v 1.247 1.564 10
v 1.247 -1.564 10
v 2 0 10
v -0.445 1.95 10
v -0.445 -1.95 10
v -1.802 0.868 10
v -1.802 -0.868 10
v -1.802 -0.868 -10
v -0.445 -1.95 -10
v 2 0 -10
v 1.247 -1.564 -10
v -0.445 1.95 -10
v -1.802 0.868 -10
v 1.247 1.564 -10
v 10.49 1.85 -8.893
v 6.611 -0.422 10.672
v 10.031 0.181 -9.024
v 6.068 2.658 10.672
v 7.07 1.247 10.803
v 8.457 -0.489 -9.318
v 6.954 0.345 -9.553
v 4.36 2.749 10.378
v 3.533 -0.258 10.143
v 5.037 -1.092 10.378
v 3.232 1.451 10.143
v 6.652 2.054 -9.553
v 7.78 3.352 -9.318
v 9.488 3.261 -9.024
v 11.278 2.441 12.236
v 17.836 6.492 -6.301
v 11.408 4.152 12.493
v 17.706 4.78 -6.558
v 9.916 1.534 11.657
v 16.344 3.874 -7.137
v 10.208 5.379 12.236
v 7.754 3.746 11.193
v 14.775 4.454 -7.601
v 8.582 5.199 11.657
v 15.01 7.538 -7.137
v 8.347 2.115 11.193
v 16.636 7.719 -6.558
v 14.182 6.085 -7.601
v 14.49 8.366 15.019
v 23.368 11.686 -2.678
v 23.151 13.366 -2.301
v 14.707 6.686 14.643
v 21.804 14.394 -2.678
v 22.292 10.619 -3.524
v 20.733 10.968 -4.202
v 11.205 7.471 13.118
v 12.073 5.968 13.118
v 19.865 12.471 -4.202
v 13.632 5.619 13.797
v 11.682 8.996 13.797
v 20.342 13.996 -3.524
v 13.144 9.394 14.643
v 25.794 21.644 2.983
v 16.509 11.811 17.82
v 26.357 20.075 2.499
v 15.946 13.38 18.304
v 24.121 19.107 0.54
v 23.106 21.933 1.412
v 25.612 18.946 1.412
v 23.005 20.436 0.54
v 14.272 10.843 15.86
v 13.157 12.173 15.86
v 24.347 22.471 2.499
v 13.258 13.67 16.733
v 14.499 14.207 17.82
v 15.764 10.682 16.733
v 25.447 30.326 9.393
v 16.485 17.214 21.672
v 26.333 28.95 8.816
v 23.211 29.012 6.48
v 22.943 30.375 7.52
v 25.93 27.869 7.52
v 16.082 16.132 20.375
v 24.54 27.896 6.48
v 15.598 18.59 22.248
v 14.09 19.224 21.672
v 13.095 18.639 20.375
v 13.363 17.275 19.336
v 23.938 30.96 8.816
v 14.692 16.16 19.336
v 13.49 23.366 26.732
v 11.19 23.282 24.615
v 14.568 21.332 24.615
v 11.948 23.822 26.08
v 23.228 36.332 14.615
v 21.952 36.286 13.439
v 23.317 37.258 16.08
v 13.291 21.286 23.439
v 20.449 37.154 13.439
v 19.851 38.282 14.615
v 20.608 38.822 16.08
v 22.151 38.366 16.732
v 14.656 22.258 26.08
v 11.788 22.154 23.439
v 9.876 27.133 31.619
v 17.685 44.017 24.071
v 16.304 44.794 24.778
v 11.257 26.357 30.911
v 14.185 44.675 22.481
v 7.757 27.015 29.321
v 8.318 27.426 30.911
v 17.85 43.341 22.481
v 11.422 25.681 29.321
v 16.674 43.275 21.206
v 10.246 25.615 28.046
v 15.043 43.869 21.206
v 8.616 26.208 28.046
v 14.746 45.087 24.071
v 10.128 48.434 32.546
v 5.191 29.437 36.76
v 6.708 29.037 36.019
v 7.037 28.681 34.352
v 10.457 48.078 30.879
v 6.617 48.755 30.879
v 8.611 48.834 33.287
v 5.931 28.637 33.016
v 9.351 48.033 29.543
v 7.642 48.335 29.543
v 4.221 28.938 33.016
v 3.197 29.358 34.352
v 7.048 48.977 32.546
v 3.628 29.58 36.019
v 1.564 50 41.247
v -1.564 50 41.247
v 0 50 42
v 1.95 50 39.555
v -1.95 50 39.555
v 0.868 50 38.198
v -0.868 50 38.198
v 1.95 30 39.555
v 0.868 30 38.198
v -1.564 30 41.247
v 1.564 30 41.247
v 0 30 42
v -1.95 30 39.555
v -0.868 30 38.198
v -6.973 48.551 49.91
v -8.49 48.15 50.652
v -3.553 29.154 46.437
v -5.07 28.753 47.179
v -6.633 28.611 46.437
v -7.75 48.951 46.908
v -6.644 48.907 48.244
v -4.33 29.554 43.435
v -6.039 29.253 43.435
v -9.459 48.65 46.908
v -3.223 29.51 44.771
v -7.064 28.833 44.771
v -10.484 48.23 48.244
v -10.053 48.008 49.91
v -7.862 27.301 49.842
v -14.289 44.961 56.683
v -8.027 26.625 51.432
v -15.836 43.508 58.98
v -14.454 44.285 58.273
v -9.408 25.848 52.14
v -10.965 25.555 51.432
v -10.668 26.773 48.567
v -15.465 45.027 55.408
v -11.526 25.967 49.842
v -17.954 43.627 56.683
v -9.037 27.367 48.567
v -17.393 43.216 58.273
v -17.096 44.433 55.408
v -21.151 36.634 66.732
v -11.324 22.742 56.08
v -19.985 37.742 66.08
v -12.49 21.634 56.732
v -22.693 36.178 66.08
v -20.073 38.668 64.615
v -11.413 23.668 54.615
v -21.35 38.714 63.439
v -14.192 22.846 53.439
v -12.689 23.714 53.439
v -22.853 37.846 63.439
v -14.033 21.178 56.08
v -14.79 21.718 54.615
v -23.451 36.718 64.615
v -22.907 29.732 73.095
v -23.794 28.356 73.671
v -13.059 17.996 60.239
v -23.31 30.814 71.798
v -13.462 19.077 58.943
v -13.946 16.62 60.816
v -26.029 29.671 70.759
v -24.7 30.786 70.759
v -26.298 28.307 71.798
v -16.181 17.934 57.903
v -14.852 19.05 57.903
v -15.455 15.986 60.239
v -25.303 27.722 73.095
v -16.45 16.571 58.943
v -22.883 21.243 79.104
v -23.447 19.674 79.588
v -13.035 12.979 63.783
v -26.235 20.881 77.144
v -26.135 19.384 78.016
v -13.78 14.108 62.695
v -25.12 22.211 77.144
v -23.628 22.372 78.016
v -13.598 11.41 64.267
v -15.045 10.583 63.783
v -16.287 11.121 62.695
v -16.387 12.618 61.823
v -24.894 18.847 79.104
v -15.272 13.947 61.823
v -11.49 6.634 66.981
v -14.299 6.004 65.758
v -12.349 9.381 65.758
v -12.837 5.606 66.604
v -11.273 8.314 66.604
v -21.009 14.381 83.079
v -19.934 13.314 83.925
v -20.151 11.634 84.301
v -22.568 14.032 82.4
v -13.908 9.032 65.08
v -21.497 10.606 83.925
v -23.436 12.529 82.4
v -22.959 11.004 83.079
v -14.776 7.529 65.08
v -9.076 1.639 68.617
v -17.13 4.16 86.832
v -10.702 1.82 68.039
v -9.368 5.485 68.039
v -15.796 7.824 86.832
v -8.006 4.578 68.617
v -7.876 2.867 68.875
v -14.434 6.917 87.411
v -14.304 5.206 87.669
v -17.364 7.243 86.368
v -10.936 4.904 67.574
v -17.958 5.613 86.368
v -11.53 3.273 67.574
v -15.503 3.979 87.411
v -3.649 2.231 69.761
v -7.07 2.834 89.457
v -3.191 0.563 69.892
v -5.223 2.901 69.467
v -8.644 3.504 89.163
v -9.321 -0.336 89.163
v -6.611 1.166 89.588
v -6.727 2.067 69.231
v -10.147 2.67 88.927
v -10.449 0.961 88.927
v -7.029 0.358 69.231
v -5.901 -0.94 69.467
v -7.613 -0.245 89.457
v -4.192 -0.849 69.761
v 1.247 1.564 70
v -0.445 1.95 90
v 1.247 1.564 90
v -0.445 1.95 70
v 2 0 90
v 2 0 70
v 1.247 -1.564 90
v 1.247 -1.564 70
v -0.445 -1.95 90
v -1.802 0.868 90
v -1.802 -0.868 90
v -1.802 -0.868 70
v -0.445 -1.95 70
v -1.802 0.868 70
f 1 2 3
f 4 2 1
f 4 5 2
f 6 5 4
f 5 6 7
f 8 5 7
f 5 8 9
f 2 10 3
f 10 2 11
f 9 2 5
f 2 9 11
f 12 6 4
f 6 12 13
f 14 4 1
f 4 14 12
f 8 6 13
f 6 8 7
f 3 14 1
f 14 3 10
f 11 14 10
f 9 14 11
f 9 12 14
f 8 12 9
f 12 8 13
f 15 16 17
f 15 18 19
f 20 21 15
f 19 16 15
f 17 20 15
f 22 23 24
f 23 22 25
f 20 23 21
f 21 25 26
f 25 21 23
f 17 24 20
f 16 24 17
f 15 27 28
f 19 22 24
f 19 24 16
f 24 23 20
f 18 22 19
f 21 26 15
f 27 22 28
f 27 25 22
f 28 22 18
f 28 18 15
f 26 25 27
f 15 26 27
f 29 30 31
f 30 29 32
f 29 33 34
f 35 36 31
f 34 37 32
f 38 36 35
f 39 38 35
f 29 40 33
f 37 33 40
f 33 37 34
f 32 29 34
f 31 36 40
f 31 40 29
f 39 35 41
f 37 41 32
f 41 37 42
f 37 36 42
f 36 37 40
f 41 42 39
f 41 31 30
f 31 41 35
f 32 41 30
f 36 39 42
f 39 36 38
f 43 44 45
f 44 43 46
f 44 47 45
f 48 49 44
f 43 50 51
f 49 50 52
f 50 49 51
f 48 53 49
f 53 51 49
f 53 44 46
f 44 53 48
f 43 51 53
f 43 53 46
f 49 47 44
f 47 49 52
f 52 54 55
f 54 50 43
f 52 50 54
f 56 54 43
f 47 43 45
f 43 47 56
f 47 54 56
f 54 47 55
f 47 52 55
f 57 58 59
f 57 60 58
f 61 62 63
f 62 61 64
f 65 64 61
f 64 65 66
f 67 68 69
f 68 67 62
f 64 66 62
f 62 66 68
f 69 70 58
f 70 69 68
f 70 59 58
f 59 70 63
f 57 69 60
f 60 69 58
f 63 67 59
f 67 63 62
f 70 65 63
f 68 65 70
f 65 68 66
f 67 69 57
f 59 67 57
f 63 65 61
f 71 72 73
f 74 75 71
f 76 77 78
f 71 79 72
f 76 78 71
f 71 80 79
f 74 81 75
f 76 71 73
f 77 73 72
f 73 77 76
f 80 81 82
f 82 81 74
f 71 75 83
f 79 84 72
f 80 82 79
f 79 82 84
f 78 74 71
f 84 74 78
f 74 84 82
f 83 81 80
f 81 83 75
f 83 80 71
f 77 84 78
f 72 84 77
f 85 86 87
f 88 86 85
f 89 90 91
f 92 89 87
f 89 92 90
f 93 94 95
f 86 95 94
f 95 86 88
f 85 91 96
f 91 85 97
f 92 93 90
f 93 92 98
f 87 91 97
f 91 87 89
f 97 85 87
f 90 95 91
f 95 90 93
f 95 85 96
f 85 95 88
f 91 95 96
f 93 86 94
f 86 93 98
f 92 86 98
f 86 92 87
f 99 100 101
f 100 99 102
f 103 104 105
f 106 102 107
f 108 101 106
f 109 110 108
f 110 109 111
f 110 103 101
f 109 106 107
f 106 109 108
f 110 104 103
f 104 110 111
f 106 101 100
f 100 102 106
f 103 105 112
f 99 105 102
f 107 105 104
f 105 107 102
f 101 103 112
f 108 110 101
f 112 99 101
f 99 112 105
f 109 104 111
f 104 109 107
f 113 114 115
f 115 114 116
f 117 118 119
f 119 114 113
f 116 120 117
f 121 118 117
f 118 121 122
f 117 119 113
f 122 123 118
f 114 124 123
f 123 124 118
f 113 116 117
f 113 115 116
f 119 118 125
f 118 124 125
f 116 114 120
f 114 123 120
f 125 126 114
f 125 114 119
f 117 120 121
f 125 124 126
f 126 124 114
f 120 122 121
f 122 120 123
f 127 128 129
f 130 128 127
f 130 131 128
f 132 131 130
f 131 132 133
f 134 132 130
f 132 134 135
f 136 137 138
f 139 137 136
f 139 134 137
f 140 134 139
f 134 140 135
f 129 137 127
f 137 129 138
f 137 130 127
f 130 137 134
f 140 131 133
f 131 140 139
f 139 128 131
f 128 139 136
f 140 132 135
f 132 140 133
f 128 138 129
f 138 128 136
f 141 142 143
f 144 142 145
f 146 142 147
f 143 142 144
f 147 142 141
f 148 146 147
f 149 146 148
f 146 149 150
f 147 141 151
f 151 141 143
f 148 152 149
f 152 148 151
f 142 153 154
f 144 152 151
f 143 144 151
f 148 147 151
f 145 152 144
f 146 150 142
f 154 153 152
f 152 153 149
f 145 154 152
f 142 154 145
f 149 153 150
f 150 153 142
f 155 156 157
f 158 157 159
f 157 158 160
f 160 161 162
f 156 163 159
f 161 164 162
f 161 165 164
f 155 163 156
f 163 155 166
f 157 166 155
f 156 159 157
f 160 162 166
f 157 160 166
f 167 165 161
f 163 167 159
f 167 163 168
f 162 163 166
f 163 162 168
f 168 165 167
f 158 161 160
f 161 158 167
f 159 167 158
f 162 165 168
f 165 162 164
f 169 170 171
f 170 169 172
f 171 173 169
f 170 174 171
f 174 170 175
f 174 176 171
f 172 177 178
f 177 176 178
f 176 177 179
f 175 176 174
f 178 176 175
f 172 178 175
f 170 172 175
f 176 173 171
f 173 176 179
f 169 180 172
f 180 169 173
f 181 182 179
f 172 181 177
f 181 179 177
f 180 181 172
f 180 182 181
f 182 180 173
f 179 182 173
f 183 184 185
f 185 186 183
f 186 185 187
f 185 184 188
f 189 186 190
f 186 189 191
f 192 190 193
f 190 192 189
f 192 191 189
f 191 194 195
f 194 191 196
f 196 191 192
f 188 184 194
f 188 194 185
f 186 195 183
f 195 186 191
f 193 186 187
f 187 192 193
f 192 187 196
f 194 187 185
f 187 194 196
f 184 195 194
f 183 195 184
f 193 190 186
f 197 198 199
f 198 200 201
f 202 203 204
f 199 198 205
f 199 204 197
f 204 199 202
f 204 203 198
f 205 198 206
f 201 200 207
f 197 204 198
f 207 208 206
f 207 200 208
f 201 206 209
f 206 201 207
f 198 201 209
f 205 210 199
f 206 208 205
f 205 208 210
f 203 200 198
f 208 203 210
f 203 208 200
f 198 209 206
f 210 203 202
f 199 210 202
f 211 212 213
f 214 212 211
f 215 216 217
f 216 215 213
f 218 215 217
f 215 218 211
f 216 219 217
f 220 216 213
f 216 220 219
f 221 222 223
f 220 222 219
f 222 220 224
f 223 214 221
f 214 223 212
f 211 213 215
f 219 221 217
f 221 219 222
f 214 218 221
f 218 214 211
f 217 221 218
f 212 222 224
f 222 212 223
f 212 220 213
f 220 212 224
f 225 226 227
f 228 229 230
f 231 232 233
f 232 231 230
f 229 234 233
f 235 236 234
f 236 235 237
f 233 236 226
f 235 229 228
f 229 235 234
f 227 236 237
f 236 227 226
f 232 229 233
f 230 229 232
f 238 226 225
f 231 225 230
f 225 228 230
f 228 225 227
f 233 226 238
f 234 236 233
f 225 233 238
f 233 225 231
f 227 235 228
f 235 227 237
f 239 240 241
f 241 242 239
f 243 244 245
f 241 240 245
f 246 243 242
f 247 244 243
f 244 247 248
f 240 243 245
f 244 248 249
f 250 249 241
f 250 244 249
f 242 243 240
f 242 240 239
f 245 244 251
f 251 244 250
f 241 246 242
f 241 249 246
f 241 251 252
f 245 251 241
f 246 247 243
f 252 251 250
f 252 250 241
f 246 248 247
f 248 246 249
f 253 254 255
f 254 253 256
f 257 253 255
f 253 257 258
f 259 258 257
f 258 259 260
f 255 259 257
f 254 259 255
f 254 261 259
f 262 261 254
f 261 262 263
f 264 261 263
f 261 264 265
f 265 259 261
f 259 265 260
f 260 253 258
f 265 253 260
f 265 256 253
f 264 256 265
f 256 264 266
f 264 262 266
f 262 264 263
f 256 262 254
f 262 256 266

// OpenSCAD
module q(){
  cube([10,1,1],center=true);
  }
  
module c(){
    cube([1,1,1],center=true);
  }
  module o(){
    cylinder(1,2,2);
    }
  module cycle_rotate(i){
    for(i=[0:360/i:360])
  rotate([0,0,i])children();
    
  }
  module layer(l,h,angle=0){
    for(i=[0:h/l:h]){
      translate([0,i*angle,i])children();
      }
    }
    module sin_cycle(l,h,angle=0){
       for(i=[0:h/l:h]){
      translate([0,sin(i/3.14),i])children();
      }
      }

    //cycle_rotate(10)sin_cycle(10,10,-2)q();
module main0(){
for(b=[0:1:2]){
  for(a=[0:5:360]){
rotate([0,0,b*90])translate([0,sin(10*$t*360),a/10])rotate([0,0,a+$t*360])scale([1+sin(10*$t*360)*sin(a)+1,1,1+1])q();
  }
}

};

module main1(l){
  
  for(i=[0:360/l:90]){
  translate([0,i/10,0])rotate([0,i+0.2*i*$t*360,0])scale([1,1,3+10*i/90])c();
  }
  
  }
module main2(){
  for(i=[0:10:360]){

translate([0,0,4*i/360*(2+sin($t*360*30))])
rotate([0,0,i*2])
    translate([0,3,0])
c();
  }
}
module main3(){
  rotate([0,0,$t*360*30])
  for(i=[0:5:360]){
rotate([0,0,i*2])
    translate([0,4*i/360*(1.5+sin($t*360*10)),0])
c();
  }
  
  }
  module main4(){
  for(i=[0:10:360]){
      rotate([0,0,i*$t*360*0.05])
    translate([0,$t*360/100+i/30,i*0.01])
//  rotate([0,0,i*$t*360])
//    translate([sin($t*360*4)*i/10,cos($t*360)*i/10,0])
  
q();
  }
  
  }
module   main5(){
for(x=[-8:1:8]){
for(y=[-8:1:8]){
translate([x,y,0])
scale([1,1,3+3*cos(y*36*$t*15)*sin(x*36*$t*15)])  c();    
    }
  }

  }
  module main6(){
    rotate([0,0,$t*360])
    for(r=[0:45:4*90]){
      rotate([0,0,r])translate([10*(2+sin(10*$t*360)),0,0])
      for(i=[0:30:360]){
        rotate([0,0,i+4*$t*360])
        translate([2,0,0])
        scale([10*(1+sin(10*$t*360)),1,2])c();
        }
         rotate([0,0,r+45/2])translate([5*(2+sin(10*$t*360)),0,0])cube([10*(2+sin(10*$t*360)),1,1],center=true);
      }
     
    }
    module main7(){
//     translate([0,sin($t*360),0]) 
      rotate([0,0,$t*360*10/2])
      translate([0,10*sin($t*360),$t*360*5/100]) 
       rotate([0,0,$t*360*10])
      q();
      color("gray")
      for(i=[1:1:360]){
         rotate([0,0,i*10/2])
      translate([0,10*sin(i),i*5/100]) 
       rotate([0,0,i*10])
      c();
        }
      }
      module main8(){
      color("gray")
      for(i=[1:1:360]){
         rotate([0,0,i*10])
      translate([0,i*sin($t*360),0]) 
       rotate([0,0,$t*360*1])
      q();
        }
      }
module       main9(){
   for(x=[-8:1:8]){
for(y=[-8:1:8]){
translate([x*5,y*5,0])
scale([1,1,(3+3*cos(y*36*$t*15)*sin(x*36*$t*15))*5])
rotate([0,0,$t*360*6])  
  o();    
    }
  }
  
  }
  module main10(){
    for(i=[1:10]){
      translate([0,0,-i])
    rotate([0,0,i*$t*360*6*10])  
    scale([i,i,1])
  o();    
    }
      rotate([0,0,$t*360*6])  
     translate([0,0,20*(1+sin($t*360*10))])
    scale([1,1,30])
    o();
    
    translate([0,0,20*(2+sin($t*360*10))])
     rotate([0,0,$t*360*6])  
    for(r=[0:10:60]){
    for(i=[0:30:360]){
       rotate([0+r,60+r,i+r])  
        translate([0,$t*360/30,30])
      scale([1,1,20])
      o();
      }
    }
    }
    module main11(){
      color("gold")
     translate([0,0,20*(2)])
//     rotate([0,0,$t*360])  
    for(r=[180:10:360]){
       rotate([0,0,r])  
    for(i=[0:60:360]){
       rotate([0,r,i*sin($t*360*1)])  
        translate([0,$t*360/30,30])
      scale([1,1,20])
      o();
      }
    }
      
      }
//main0();
//main1(100);
//  main2();
//  main3();
//  main4();
//  main5();
  //main6();
    
//  main7();
//      main8();
//      main9();
  //main10();
  main11();
      
      
      
    
    
